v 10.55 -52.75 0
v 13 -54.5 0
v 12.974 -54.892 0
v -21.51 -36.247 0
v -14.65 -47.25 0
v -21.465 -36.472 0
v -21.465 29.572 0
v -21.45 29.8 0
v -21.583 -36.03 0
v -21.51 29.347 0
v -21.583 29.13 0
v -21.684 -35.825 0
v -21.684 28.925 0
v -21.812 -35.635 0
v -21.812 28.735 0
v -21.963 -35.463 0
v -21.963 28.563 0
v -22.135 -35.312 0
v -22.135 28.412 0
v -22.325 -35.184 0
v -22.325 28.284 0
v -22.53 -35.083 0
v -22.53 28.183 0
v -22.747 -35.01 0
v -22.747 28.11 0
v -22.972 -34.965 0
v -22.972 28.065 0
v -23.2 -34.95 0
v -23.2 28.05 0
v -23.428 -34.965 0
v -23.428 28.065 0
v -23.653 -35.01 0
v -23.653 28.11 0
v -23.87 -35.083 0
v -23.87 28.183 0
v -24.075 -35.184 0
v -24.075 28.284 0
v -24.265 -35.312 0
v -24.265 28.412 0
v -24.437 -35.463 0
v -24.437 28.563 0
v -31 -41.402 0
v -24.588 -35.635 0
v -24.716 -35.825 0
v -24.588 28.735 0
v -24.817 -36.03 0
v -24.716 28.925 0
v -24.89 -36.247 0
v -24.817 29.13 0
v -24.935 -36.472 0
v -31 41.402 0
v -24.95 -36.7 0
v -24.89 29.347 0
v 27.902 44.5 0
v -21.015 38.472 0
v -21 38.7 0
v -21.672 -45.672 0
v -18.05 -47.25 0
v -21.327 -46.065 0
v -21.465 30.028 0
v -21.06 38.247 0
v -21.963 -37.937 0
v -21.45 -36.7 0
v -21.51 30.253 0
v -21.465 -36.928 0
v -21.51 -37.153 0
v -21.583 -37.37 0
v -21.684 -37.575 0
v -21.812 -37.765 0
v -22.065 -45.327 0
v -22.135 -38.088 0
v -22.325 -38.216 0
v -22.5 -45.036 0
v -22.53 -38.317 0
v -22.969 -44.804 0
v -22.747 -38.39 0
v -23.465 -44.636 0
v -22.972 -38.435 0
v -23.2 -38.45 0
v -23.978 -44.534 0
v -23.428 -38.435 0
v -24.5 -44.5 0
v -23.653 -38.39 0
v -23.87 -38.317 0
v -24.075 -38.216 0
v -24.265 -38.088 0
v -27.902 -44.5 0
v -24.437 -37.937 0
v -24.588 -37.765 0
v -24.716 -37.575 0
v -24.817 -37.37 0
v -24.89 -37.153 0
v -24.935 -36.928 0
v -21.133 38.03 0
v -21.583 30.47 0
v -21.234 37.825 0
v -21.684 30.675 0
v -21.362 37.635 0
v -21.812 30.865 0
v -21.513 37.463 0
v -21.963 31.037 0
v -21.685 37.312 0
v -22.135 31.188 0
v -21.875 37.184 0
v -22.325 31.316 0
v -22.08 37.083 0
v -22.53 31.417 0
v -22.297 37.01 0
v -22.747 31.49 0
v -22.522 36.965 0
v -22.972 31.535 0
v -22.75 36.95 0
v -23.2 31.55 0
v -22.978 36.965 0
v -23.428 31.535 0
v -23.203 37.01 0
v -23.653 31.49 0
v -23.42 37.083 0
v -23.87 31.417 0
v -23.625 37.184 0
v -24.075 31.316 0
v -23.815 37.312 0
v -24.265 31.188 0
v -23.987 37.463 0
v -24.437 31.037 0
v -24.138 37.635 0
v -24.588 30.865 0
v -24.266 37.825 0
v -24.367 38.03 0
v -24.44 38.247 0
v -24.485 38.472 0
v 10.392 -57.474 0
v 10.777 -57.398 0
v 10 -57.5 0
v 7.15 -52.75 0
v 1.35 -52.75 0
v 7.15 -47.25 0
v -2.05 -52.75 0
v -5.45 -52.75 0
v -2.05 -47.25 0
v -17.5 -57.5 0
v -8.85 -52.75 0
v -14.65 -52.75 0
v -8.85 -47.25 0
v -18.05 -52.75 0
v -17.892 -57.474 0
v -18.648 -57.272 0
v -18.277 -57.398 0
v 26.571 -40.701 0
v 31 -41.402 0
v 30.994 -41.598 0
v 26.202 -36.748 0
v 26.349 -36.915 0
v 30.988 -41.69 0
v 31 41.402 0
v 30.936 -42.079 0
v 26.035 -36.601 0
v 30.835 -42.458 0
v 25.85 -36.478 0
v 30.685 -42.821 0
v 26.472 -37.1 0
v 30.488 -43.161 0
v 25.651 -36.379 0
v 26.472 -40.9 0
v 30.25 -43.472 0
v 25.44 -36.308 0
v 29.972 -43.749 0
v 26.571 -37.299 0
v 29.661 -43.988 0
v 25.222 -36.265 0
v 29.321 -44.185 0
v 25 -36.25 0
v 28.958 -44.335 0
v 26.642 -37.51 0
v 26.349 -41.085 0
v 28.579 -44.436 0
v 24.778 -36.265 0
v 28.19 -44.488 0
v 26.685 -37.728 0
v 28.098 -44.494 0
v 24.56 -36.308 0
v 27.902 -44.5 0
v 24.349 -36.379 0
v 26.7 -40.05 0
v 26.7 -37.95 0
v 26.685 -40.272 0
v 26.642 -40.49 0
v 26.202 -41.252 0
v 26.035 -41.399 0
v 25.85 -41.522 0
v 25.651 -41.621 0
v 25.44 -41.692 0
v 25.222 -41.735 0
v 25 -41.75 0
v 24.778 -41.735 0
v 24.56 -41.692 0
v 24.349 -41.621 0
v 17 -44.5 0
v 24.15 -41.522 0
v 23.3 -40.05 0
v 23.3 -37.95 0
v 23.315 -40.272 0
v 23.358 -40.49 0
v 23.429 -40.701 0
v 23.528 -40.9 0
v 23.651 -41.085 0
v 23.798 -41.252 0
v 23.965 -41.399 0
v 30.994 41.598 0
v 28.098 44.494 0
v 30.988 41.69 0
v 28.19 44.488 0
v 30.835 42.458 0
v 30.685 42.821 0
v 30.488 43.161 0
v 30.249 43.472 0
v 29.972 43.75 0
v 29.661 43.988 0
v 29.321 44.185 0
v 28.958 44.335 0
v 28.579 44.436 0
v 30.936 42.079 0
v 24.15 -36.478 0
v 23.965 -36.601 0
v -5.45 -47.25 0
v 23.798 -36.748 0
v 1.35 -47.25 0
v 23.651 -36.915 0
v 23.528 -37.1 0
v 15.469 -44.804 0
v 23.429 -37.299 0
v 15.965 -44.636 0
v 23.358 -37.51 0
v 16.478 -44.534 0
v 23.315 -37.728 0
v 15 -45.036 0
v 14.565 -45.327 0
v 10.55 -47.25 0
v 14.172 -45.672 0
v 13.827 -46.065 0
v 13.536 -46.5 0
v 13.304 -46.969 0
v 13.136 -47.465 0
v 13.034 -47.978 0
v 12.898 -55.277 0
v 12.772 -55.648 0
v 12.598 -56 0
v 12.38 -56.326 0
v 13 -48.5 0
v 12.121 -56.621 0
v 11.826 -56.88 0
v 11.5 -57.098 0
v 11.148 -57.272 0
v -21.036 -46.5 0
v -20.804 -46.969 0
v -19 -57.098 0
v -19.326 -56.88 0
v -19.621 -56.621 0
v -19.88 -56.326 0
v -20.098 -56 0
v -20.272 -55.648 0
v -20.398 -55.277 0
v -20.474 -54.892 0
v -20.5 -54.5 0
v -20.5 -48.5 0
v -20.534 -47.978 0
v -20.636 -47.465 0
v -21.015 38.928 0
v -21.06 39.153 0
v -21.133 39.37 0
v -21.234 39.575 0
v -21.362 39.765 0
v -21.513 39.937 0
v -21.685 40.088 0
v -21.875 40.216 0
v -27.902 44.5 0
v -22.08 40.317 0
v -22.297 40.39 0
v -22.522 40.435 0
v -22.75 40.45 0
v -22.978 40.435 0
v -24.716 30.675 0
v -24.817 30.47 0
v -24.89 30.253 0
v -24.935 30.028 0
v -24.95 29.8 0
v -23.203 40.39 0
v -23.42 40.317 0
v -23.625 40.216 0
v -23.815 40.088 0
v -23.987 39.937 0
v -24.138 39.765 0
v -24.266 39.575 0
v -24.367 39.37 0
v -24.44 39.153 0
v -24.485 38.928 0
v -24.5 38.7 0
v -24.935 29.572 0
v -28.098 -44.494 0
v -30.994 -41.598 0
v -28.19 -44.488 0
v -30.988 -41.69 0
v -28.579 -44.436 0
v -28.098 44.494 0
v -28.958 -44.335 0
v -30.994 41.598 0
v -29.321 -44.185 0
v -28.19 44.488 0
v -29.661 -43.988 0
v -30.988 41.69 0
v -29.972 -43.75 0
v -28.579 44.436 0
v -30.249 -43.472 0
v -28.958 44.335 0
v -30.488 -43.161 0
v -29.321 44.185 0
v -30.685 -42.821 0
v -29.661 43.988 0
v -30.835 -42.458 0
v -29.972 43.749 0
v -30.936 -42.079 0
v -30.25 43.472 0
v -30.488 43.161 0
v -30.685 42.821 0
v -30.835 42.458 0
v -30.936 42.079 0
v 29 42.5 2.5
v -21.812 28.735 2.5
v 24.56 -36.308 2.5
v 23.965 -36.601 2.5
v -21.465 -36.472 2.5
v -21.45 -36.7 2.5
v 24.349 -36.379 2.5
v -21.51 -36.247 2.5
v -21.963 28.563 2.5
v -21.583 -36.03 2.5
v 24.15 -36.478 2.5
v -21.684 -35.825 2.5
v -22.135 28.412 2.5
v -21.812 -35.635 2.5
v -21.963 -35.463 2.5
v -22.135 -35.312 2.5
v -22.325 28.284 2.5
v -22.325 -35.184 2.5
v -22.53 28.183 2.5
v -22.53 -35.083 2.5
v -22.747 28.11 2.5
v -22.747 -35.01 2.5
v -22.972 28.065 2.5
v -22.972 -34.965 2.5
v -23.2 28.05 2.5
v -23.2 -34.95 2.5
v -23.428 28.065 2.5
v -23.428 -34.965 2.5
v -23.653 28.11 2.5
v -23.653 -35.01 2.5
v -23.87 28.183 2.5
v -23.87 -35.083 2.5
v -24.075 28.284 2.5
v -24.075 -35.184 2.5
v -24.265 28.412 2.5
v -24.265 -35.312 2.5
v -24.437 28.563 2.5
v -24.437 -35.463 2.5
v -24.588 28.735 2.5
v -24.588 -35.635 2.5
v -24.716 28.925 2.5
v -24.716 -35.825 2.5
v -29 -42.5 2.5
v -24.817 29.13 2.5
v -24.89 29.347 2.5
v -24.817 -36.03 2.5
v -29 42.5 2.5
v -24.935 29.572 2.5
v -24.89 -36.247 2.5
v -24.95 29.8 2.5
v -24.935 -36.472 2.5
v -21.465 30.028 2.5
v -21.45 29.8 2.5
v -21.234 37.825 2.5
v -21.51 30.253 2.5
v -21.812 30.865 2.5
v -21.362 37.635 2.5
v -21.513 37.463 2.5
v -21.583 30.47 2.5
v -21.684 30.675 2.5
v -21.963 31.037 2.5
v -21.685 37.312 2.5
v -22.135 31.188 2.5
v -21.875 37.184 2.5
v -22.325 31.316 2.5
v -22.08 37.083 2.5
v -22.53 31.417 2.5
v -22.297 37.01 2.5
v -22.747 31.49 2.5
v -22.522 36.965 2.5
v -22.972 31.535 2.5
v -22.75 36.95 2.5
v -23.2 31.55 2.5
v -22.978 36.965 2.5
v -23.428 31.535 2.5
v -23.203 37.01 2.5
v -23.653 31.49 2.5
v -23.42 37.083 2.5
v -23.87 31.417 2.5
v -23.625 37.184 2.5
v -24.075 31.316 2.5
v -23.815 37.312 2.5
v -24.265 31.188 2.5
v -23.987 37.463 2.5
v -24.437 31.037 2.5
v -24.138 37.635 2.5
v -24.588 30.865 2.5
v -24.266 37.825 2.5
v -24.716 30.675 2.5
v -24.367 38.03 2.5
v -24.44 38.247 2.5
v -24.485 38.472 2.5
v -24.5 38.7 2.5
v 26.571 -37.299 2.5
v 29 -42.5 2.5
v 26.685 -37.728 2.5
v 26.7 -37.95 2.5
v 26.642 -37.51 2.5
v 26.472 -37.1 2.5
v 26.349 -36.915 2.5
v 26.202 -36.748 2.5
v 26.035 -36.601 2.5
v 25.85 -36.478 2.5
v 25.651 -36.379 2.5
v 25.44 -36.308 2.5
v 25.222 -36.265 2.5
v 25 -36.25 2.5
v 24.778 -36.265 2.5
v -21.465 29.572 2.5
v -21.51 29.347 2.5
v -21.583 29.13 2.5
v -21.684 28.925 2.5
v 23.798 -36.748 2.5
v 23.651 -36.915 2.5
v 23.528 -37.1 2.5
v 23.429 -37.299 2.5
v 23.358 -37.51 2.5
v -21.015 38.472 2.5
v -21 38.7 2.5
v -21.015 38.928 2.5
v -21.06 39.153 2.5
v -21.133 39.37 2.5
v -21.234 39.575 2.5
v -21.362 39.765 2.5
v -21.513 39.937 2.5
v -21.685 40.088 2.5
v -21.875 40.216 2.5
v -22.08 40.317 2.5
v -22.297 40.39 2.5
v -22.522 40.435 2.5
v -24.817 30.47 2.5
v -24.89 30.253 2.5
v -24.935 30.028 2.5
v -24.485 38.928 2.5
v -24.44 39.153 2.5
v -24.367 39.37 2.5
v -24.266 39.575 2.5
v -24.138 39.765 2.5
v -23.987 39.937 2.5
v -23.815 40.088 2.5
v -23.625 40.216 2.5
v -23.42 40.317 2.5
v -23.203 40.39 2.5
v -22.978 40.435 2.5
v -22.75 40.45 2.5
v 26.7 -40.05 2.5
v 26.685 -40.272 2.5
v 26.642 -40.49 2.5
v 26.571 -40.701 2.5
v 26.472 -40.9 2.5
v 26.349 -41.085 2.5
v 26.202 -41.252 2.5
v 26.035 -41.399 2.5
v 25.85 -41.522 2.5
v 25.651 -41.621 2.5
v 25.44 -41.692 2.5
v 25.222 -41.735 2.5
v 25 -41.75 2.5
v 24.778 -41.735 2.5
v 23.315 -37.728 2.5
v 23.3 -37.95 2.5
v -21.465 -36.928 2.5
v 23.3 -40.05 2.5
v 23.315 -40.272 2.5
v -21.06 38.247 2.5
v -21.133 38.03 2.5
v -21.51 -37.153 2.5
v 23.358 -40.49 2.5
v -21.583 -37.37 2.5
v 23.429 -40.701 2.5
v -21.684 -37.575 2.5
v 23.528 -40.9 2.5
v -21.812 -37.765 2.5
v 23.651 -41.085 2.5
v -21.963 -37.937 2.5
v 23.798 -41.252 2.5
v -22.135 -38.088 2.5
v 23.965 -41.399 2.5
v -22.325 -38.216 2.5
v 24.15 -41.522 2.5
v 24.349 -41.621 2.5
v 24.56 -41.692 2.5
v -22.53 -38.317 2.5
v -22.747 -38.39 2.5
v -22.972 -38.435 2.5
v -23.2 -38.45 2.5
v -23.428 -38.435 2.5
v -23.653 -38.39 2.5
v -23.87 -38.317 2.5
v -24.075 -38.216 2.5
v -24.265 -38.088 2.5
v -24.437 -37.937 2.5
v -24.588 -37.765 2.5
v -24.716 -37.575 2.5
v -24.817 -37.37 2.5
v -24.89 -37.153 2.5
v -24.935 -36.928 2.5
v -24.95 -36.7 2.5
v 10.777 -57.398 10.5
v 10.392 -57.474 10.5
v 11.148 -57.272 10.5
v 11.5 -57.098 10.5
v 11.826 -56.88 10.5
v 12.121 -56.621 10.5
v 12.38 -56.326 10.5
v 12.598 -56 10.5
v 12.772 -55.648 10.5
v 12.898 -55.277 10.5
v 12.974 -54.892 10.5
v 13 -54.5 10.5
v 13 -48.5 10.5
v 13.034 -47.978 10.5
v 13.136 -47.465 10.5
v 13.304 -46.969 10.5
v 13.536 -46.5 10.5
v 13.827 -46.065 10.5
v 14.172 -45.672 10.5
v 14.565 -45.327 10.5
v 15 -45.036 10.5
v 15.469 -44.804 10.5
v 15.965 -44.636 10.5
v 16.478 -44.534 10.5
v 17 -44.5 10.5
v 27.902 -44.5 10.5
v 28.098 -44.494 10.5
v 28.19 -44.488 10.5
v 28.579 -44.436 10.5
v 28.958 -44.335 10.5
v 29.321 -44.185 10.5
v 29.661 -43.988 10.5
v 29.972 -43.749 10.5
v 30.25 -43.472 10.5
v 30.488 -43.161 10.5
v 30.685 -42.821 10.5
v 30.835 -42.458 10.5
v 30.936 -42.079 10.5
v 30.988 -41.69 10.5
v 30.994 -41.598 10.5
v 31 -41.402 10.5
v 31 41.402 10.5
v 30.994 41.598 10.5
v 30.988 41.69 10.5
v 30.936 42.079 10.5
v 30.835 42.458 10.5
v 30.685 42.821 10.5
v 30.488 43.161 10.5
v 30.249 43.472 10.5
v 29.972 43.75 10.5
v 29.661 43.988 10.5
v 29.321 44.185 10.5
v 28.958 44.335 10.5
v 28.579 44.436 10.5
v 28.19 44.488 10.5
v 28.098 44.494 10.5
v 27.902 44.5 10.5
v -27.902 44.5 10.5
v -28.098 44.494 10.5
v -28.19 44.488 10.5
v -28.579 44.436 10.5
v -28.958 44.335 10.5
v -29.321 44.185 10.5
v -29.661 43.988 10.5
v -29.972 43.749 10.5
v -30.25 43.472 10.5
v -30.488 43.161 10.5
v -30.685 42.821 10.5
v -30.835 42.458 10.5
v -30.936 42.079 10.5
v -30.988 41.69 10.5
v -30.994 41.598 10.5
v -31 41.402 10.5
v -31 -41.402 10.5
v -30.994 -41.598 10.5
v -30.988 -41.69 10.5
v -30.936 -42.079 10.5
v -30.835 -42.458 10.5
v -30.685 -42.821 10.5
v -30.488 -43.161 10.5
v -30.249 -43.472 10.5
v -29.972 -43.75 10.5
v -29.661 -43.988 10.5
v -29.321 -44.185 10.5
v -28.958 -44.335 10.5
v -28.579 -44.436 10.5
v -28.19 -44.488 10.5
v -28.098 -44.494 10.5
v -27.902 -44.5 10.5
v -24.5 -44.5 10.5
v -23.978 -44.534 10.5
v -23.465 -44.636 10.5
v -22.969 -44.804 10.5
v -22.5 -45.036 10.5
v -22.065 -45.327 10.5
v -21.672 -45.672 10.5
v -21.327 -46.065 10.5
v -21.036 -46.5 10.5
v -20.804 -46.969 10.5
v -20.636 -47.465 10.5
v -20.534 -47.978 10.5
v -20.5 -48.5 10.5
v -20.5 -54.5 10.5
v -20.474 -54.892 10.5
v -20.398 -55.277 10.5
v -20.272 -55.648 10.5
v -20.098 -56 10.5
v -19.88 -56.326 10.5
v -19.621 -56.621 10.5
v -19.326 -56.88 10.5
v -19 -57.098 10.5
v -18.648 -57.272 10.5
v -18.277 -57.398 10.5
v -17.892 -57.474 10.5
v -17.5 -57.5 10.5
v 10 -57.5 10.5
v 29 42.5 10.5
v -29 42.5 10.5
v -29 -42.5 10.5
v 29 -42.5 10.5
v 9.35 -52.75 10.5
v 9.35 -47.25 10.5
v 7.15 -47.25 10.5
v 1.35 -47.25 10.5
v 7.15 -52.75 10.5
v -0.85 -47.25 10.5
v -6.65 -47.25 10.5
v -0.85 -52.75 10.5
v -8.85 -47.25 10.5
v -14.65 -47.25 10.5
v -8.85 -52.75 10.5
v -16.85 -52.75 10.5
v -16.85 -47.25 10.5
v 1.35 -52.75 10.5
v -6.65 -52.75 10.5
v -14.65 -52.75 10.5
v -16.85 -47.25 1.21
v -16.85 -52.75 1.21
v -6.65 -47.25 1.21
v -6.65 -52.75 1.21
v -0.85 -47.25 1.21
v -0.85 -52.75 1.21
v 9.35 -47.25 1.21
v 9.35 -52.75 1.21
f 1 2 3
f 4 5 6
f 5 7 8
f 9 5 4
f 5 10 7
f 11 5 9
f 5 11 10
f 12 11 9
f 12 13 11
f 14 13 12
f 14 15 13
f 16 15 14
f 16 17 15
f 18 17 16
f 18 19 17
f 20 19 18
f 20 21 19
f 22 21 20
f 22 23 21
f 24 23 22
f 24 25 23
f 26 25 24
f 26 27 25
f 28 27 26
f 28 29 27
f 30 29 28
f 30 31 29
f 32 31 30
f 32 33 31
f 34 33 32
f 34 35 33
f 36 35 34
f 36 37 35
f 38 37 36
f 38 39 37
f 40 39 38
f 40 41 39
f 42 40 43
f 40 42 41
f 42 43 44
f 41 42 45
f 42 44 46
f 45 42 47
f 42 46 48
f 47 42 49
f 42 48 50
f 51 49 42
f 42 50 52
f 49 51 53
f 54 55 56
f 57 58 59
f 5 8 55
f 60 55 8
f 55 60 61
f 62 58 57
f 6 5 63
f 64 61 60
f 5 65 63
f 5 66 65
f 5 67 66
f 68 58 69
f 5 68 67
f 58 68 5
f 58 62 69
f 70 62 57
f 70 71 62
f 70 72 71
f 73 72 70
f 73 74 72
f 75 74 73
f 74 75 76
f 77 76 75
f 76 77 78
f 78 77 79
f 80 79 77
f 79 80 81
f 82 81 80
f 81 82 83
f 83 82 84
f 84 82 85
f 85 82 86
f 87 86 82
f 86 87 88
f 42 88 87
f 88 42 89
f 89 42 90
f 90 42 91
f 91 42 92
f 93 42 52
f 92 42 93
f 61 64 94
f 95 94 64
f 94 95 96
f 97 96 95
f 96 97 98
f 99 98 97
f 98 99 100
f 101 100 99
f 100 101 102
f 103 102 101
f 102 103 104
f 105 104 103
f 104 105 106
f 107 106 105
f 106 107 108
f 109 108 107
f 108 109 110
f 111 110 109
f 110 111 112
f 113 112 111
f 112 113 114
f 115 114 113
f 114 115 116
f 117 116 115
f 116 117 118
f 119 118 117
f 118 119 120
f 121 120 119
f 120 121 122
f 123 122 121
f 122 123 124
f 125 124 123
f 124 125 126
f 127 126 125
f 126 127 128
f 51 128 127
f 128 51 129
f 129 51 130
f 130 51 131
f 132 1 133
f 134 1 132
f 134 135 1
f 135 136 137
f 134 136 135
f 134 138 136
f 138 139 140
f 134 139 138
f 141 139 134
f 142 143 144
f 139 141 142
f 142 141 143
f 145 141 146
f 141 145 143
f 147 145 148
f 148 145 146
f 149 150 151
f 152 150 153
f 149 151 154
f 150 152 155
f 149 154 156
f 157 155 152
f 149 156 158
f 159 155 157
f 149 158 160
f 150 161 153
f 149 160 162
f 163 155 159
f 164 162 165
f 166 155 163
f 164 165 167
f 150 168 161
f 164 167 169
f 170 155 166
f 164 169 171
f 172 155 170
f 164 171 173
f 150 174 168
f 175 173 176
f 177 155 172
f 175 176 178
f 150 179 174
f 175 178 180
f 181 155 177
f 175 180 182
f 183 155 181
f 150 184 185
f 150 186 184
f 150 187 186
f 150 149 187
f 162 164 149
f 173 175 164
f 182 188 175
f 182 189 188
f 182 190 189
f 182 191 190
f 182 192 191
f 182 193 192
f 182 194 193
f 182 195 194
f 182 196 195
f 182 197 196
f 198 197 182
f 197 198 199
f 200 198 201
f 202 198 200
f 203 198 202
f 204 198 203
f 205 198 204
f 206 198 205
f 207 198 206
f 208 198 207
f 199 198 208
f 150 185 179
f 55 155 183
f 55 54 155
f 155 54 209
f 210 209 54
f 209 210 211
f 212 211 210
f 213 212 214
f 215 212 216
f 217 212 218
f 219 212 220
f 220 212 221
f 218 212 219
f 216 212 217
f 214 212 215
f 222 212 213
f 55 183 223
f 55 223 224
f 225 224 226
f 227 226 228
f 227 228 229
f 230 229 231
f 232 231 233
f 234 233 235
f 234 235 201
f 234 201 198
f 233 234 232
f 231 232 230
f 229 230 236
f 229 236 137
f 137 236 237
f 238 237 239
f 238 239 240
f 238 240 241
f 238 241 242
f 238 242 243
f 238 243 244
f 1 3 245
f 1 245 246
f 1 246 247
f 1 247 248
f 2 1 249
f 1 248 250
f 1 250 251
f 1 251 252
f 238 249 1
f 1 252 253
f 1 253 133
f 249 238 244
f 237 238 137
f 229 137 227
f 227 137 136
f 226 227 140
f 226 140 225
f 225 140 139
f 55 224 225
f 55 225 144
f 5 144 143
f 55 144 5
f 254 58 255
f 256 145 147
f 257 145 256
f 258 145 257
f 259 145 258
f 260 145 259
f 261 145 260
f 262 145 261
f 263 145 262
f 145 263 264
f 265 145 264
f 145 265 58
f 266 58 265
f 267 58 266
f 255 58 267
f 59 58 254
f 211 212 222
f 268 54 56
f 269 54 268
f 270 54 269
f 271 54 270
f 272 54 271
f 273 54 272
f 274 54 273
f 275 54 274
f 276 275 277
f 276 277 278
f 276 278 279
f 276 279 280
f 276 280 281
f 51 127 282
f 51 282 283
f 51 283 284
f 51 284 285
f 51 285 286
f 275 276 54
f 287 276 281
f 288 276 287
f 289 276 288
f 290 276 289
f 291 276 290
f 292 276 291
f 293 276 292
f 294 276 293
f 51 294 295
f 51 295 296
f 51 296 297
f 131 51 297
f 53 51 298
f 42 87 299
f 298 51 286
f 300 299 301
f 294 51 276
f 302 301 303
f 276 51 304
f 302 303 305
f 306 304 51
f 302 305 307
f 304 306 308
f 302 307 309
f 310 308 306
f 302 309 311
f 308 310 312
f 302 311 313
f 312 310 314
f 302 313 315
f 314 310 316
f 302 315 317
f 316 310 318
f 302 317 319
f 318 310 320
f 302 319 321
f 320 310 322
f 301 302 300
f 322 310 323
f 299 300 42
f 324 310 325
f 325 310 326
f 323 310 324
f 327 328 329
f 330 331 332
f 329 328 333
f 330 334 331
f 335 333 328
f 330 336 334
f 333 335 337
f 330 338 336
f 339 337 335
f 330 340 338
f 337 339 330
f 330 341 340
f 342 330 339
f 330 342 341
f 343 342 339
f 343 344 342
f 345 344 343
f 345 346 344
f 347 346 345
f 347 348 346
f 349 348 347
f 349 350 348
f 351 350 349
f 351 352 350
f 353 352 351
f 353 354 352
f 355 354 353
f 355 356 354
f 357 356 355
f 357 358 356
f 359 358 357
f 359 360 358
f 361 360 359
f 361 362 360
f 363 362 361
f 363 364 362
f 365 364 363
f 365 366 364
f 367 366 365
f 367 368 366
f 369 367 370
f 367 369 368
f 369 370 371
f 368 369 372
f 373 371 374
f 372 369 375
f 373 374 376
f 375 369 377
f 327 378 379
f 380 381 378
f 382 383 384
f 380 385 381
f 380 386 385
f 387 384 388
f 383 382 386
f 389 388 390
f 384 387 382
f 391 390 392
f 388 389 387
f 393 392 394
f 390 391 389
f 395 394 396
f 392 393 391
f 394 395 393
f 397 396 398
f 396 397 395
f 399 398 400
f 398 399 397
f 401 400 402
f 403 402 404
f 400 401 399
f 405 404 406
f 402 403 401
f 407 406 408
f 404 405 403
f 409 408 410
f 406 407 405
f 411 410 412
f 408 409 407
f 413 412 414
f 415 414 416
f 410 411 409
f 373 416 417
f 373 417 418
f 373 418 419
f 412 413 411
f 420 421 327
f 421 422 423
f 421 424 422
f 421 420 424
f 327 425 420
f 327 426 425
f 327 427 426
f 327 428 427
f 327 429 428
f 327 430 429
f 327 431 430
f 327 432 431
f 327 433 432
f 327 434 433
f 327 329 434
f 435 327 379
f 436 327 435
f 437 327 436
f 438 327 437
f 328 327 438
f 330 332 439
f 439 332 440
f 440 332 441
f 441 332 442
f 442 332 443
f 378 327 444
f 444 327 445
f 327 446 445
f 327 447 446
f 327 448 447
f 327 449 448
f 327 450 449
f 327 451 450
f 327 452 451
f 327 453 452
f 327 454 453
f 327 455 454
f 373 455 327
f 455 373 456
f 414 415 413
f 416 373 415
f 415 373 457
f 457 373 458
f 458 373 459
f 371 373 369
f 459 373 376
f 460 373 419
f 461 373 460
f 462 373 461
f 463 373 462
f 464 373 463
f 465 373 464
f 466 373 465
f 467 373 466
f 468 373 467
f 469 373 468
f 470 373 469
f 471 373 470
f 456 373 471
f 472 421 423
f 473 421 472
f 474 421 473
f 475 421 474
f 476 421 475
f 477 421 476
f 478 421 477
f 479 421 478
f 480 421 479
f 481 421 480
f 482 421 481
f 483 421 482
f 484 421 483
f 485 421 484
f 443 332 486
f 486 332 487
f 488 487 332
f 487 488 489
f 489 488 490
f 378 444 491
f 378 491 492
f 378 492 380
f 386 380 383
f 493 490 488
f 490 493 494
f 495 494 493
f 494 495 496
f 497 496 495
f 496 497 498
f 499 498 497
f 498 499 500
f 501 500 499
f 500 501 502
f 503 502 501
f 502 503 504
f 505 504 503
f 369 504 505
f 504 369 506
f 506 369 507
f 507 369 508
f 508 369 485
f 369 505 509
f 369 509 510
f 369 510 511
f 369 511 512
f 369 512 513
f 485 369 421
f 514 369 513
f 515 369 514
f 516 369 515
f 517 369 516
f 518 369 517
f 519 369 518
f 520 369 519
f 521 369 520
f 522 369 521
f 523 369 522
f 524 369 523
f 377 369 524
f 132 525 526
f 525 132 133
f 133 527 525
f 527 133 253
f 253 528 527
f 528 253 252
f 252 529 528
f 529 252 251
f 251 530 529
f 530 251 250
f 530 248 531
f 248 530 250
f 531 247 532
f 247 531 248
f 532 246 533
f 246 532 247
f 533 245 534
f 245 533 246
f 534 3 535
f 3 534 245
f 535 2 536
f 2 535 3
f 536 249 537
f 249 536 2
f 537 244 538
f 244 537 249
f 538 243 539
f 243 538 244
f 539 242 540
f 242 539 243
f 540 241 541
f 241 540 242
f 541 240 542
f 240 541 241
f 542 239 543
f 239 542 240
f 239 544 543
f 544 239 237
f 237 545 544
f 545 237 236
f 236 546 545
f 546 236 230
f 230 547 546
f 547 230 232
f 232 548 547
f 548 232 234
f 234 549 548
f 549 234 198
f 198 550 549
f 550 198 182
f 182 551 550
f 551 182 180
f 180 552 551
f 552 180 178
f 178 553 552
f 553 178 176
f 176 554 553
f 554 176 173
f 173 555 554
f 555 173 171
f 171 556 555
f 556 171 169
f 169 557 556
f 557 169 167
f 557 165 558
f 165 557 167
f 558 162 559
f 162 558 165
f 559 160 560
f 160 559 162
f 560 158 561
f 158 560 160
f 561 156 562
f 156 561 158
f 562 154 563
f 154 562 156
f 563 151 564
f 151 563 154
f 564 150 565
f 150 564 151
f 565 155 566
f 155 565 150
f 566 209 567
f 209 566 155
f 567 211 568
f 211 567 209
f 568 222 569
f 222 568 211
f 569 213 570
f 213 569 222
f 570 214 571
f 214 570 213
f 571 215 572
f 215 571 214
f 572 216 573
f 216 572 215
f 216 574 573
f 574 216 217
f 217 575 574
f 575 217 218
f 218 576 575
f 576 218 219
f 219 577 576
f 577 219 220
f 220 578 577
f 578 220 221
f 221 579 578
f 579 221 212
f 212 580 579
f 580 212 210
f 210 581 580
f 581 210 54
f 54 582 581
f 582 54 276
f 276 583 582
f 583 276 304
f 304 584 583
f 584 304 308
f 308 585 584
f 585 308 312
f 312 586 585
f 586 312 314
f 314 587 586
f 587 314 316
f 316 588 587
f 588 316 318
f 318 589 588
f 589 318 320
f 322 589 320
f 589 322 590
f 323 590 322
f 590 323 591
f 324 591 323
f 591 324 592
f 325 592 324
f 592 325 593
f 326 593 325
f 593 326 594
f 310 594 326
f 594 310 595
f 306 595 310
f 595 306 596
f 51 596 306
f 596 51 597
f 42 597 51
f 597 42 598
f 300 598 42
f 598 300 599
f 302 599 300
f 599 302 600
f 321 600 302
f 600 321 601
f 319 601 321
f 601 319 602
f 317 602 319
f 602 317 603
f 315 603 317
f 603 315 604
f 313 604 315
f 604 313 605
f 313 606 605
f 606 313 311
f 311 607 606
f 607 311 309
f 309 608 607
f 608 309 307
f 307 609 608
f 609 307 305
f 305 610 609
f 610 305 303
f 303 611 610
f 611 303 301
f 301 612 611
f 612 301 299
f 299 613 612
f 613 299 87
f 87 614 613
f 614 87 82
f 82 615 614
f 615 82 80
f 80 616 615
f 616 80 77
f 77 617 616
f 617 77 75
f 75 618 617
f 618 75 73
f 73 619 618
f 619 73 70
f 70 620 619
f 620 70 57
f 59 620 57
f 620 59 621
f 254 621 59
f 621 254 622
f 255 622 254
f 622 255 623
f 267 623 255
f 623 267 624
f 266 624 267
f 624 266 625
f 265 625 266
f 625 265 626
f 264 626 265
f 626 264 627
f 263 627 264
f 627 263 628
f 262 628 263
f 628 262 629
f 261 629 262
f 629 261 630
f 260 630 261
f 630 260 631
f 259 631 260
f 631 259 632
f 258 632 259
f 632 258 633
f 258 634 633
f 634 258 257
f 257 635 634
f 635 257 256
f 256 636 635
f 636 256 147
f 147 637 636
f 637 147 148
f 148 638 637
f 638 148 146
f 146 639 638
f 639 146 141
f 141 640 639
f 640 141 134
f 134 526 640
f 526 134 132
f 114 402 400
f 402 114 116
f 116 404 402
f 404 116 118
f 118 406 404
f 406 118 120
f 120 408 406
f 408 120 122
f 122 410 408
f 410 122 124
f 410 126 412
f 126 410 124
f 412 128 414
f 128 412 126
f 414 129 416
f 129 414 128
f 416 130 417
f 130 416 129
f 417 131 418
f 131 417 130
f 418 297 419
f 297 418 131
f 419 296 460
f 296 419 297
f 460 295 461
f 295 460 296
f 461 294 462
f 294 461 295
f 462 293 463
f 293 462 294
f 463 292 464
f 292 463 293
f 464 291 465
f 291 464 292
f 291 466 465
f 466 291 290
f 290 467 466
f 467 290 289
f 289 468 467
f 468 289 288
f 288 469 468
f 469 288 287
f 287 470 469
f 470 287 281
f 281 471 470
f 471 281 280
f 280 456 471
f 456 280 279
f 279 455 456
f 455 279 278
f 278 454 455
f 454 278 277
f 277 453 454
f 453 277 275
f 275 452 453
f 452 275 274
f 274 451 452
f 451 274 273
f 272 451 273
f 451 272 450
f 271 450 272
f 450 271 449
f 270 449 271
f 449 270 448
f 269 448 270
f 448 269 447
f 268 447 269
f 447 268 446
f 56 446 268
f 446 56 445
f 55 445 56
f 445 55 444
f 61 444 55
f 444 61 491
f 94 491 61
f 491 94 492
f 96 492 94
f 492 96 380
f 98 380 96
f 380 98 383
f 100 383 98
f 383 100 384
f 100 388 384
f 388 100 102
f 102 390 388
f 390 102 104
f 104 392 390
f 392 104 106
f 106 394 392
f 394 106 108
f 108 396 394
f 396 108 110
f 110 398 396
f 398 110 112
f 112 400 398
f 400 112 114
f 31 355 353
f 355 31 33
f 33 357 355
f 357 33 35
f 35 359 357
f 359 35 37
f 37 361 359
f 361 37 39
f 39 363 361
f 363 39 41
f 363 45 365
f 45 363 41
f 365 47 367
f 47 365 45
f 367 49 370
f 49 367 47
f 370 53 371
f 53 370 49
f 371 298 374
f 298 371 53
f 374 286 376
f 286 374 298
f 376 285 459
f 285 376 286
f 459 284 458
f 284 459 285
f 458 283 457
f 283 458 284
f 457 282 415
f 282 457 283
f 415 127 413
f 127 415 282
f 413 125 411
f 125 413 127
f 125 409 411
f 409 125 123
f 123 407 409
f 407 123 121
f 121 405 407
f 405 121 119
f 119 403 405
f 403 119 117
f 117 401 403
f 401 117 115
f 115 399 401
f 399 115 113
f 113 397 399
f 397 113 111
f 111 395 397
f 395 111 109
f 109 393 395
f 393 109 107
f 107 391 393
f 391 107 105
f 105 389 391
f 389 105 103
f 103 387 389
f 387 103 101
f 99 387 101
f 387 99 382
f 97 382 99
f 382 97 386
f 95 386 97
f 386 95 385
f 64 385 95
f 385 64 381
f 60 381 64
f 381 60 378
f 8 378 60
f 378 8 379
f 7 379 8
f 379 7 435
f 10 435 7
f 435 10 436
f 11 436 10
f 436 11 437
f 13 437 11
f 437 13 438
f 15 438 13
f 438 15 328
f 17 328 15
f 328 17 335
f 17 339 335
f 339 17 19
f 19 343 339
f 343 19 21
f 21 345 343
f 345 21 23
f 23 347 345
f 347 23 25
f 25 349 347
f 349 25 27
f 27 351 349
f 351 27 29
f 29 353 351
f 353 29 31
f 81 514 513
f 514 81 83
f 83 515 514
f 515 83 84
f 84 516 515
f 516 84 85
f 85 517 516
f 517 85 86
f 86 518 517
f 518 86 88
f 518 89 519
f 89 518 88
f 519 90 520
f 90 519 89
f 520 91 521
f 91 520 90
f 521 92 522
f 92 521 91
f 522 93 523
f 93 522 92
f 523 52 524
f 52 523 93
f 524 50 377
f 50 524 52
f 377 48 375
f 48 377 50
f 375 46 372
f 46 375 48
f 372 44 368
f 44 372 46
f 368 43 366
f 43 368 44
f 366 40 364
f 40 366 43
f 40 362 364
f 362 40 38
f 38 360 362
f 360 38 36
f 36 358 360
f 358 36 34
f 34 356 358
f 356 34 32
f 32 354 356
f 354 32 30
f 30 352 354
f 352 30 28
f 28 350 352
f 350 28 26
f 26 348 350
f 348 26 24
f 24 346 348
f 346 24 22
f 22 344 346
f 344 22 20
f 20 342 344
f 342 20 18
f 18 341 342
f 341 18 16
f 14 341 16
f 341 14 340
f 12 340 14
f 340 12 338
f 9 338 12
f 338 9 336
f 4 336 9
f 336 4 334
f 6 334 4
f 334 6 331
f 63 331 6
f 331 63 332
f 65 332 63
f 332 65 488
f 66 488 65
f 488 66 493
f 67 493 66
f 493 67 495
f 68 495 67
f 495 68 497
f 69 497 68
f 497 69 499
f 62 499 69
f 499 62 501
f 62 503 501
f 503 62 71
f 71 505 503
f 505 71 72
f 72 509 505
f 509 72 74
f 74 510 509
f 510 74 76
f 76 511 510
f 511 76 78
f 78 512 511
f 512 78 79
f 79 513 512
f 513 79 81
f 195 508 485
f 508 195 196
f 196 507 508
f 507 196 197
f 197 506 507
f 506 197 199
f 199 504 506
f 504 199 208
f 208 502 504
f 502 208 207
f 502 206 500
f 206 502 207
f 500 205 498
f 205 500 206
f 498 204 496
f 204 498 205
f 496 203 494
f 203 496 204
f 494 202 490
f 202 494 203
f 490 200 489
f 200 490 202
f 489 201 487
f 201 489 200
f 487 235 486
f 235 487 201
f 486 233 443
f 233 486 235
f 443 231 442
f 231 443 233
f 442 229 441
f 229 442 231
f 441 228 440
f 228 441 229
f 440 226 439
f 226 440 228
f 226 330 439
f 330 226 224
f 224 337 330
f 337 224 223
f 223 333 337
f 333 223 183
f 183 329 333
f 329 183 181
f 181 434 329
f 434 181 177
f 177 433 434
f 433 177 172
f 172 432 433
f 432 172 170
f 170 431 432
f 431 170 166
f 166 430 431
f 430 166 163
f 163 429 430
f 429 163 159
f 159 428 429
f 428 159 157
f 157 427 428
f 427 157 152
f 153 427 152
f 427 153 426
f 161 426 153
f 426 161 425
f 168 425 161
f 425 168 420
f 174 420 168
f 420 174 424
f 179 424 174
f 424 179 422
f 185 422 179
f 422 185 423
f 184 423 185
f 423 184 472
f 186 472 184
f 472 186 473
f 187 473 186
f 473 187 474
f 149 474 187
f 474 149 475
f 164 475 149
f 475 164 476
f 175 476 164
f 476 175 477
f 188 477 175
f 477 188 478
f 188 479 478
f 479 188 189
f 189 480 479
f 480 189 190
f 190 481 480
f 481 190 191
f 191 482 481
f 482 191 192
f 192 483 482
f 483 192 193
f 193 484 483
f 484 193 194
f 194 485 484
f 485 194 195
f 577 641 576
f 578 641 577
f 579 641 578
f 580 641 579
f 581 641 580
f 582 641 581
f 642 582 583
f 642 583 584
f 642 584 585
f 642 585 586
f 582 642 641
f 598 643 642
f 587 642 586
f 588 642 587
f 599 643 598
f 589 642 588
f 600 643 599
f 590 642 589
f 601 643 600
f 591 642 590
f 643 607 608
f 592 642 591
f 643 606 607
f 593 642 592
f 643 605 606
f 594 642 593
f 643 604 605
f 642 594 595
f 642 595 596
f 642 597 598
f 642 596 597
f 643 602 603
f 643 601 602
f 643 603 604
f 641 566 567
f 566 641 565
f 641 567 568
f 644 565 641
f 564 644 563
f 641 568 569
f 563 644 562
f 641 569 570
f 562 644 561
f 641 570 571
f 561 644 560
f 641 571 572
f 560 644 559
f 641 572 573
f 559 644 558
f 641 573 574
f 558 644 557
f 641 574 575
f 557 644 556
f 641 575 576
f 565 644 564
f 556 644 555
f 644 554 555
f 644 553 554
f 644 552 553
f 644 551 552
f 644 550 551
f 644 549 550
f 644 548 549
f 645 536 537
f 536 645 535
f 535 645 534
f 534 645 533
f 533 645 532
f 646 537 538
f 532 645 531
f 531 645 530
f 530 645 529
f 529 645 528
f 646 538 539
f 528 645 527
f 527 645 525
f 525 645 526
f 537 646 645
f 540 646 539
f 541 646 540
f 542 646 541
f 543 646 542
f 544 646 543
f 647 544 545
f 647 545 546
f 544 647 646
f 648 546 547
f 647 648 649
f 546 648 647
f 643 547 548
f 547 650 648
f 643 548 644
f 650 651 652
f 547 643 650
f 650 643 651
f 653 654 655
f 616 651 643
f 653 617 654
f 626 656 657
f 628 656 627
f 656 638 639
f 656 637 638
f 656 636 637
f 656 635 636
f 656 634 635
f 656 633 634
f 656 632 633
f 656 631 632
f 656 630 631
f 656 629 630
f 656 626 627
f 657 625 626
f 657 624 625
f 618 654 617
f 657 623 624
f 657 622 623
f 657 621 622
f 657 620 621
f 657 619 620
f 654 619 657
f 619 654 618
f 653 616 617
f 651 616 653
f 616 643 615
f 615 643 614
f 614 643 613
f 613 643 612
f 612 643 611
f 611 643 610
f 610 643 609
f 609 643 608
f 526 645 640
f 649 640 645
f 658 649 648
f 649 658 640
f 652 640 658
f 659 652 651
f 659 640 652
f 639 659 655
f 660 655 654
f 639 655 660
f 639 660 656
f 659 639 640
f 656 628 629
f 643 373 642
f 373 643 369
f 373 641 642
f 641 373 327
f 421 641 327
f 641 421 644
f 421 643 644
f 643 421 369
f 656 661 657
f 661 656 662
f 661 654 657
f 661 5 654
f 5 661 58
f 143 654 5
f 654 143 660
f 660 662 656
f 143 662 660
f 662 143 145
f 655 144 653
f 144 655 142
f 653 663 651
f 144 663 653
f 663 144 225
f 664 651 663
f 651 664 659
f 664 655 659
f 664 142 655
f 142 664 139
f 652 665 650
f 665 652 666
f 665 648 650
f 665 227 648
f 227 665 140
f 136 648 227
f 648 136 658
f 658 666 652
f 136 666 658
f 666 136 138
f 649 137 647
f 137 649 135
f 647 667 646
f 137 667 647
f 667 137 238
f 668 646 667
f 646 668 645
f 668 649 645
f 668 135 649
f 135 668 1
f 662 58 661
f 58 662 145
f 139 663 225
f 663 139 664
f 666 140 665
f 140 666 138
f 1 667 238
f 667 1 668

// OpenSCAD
// DIN-rail (TS35) mount for a 58 x 85 mm enclosed AC-DC supply: PROTOTYPE, flat back, no clips yet.
// A 2.5 mm solid plate the PSU's own size, screwed (M3) to its two diagonal holes, with cut-outs for the PSU's
// pill and a loose hole where its U slot mates. A lip 8 mm tall runs round all four sides of the PSU, square-cornered inside, rounded outside; it is a thin wall
// except on the lower (-Y) side, where a 33.5 mm stretch (8.5 mm from the left edge) is a 15 mm wide, 8 mm tall shelf with two chamfered zip-tie slot pairs through it:
// a cord (one AC, one DC) leaves the PSU straight down and lies on the shelf, held by a zip tie through a slot pair either side of it.
// Print flat back down (z = 0): the PSU sits on the plate's top face inside the lip, a pocket 8 mm deep.
// The DIN clips (Printables 420009, ref_din_clip_heat_insert.stl) are removed for now; see git history.

/* [Plate] */
plate_l = 58;        // X, along the rail: the PSU's footprint (box, caliper), no overhang
plate_w = 85;        // Y, across the rail (the vertical, long side): the PSU's footprint
ext = 15;            // the lower (-Y) lip is this wide, measured from the PSU's edge: the strain-relief shelf
shelf_len = 33.5;    // the shelf runs this far along X; the rest of the lower edge is the thin lip
shelf_x = -plate_l/2 + 8.5;   // the shelf starts 8.5 mm in from the PSU's left edge (left in the top-down view)
plate_t = 2.5;       // the frame
corner_r = 3;       // outside corners of the lip
fillet_r = 4;        // where the shelf meets the thin lip, and the shelf's own outer corners

/* [Lip] the PSU sits in a pocket, the lip rises from the PSU (top) face of the plate */
lip_h = 8;           // lip height above the top face of the plate
lip_t = 2;           // lip wall thickness on the three thin sides, outside the PSU's own footprint

/* [PSU mounting features] (caliper ~; x right, y toward the back, centred on the footprint, left = left in normal view) */
hole_d = 3.5;        // M3, easy slip fit; the head bears on the rail side
slot_w = 3.4;        // the PSU's U slot and pill width (~)
holes = [[-23.2, -36.7], [-23.2, 29.8]];   // blind holes in the PSU underside: fit test 1 moved each 1 mm in X (to centre) and 1 mm in Y (toward each other)
top_hole = [-22.75, 38.7];  // loose M3 hole where the PSU's U slot mates (not a slot in the mount); fit test 1 moved it 0.75 mm toward the centre
pill = [25, -39];    // closed pill, 5.5 long tip to tip, long axis along Y (guess); fit test 1 moved it 1.5 mm to the outer edge (+X) and 1.5 mm down (-Y)
pill_len = 5.5;

/* [Zip-tie strain relief: slot pairs through the shelf and plate; the cable lies on top of the shelf, the tie loops under the back] */
tie_w = 5.5;         // slot length across the tie: takes ties up to 5 mm wide (standard), small ones too
tie_t = 2.2;         // slot width
tie_gap = 8;         // slot centre to slot centre, along X: the cord (~5-7 mm, guess) lies between them, running along Y
tie_c = 1.2;         // underside chamfer on each slot's outer edge, where the tie turns under the back
tie_off = 8;         // the two pairs sit this far either side of the shelf centre
tie_xs = [shelf_x + shelf_len/2 - tie_off, shelf_x + shelf_len/2 + tie_off];  // pair positions along X

/* [Hidden] */
$fn = 48;

tie_y = -plate_w/2 - ext/2;   // the slot pairs centre line, mid-shelf
// the pocket is the PSU's own square-cornered footprint; only the outside is rounded
module pocket() square([plate_l, plate_w], center = true);
// outer edge: lip_t round the PSU, rounded corners; on the lower side a shelf ext wide for shelf_len along X
module outline_raw() union() {
    offset(r = corner_r) square([plate_l + 2*lip_t - 2*corner_r, plate_w + 2*lip_t - 2*corner_r], center = true);
    translate([shelf_x, -plate_w/2 - ext]) square([shelf_len, ext + corner_r]);
}
// every outside corner rounded (convex), every inside corner where the shelf meets the thin lip filleted (concave)
module outline() offset(r = -fillet_r) offset(delta = fillet_r) offset(r = corner_r) offset(delta = -corner_r) outline_raw();

// the PSU's pill as a plate cut-out (closed slot); the top hole is a plain loose M3 hole
module slots2d() {
    translate(top_hole) circle(d = hole_d);
    hull() for (s = [-1, 1]) translate([pill[0], pill[1] + s*(pill_len - slot_w)/2]) circle(d = slot_w);
}

// A cord leaves the PSU's lower edge straight down (-Y) and lies on the shelf; each pair of slots straddles it, slot length
// along Y (across the tie), slot width along X. s = -1 / +1 is the left / right slot of a pair, its chamfer opening away
// from the web between them.
module tie_chamfers() {
    for (x = tie_xs, s = [-1, 1]) translate([x + s*tie_gap/2, tie_y]) hull() {
        translate([s*tie_c/2, 0, -0.5]) linear_extrude(0.5) square([tie_t + tie_c, tie_w], center = true);
        translate([0, 0, tie_c]) linear_extrude(0.01) square([tie_t, tie_w], center = true);
    }
}

// whole-height cuts (they pass through the shelf and the plate); z = 0 is the flat back
module tie_slots() { for (x = tie_xs, s = [-1, 1]) translate([x + s*tie_gap/2, tie_y, -1]) linear_extrude(lip_h + plate_t + 2) square([tie_t, tie_w], center = true); }

module mount() {
    difference() {
        union() {
            linear_extrude(plate_t) difference() {                                   // the flat back, z = 0 is the rail side
                outline();
                for (h = holes) translate(h) circle(d = hole_d);
                slots2d();
            }
            translate([0, 0, plate_t - 0.01]) linear_extrude(lip_h + 0.01) difference() { outline(); pocket(); }   // the lip, rising from the PSU side
        }
        tie_slots();
        tie_chamfers();
    }
}

mount();
